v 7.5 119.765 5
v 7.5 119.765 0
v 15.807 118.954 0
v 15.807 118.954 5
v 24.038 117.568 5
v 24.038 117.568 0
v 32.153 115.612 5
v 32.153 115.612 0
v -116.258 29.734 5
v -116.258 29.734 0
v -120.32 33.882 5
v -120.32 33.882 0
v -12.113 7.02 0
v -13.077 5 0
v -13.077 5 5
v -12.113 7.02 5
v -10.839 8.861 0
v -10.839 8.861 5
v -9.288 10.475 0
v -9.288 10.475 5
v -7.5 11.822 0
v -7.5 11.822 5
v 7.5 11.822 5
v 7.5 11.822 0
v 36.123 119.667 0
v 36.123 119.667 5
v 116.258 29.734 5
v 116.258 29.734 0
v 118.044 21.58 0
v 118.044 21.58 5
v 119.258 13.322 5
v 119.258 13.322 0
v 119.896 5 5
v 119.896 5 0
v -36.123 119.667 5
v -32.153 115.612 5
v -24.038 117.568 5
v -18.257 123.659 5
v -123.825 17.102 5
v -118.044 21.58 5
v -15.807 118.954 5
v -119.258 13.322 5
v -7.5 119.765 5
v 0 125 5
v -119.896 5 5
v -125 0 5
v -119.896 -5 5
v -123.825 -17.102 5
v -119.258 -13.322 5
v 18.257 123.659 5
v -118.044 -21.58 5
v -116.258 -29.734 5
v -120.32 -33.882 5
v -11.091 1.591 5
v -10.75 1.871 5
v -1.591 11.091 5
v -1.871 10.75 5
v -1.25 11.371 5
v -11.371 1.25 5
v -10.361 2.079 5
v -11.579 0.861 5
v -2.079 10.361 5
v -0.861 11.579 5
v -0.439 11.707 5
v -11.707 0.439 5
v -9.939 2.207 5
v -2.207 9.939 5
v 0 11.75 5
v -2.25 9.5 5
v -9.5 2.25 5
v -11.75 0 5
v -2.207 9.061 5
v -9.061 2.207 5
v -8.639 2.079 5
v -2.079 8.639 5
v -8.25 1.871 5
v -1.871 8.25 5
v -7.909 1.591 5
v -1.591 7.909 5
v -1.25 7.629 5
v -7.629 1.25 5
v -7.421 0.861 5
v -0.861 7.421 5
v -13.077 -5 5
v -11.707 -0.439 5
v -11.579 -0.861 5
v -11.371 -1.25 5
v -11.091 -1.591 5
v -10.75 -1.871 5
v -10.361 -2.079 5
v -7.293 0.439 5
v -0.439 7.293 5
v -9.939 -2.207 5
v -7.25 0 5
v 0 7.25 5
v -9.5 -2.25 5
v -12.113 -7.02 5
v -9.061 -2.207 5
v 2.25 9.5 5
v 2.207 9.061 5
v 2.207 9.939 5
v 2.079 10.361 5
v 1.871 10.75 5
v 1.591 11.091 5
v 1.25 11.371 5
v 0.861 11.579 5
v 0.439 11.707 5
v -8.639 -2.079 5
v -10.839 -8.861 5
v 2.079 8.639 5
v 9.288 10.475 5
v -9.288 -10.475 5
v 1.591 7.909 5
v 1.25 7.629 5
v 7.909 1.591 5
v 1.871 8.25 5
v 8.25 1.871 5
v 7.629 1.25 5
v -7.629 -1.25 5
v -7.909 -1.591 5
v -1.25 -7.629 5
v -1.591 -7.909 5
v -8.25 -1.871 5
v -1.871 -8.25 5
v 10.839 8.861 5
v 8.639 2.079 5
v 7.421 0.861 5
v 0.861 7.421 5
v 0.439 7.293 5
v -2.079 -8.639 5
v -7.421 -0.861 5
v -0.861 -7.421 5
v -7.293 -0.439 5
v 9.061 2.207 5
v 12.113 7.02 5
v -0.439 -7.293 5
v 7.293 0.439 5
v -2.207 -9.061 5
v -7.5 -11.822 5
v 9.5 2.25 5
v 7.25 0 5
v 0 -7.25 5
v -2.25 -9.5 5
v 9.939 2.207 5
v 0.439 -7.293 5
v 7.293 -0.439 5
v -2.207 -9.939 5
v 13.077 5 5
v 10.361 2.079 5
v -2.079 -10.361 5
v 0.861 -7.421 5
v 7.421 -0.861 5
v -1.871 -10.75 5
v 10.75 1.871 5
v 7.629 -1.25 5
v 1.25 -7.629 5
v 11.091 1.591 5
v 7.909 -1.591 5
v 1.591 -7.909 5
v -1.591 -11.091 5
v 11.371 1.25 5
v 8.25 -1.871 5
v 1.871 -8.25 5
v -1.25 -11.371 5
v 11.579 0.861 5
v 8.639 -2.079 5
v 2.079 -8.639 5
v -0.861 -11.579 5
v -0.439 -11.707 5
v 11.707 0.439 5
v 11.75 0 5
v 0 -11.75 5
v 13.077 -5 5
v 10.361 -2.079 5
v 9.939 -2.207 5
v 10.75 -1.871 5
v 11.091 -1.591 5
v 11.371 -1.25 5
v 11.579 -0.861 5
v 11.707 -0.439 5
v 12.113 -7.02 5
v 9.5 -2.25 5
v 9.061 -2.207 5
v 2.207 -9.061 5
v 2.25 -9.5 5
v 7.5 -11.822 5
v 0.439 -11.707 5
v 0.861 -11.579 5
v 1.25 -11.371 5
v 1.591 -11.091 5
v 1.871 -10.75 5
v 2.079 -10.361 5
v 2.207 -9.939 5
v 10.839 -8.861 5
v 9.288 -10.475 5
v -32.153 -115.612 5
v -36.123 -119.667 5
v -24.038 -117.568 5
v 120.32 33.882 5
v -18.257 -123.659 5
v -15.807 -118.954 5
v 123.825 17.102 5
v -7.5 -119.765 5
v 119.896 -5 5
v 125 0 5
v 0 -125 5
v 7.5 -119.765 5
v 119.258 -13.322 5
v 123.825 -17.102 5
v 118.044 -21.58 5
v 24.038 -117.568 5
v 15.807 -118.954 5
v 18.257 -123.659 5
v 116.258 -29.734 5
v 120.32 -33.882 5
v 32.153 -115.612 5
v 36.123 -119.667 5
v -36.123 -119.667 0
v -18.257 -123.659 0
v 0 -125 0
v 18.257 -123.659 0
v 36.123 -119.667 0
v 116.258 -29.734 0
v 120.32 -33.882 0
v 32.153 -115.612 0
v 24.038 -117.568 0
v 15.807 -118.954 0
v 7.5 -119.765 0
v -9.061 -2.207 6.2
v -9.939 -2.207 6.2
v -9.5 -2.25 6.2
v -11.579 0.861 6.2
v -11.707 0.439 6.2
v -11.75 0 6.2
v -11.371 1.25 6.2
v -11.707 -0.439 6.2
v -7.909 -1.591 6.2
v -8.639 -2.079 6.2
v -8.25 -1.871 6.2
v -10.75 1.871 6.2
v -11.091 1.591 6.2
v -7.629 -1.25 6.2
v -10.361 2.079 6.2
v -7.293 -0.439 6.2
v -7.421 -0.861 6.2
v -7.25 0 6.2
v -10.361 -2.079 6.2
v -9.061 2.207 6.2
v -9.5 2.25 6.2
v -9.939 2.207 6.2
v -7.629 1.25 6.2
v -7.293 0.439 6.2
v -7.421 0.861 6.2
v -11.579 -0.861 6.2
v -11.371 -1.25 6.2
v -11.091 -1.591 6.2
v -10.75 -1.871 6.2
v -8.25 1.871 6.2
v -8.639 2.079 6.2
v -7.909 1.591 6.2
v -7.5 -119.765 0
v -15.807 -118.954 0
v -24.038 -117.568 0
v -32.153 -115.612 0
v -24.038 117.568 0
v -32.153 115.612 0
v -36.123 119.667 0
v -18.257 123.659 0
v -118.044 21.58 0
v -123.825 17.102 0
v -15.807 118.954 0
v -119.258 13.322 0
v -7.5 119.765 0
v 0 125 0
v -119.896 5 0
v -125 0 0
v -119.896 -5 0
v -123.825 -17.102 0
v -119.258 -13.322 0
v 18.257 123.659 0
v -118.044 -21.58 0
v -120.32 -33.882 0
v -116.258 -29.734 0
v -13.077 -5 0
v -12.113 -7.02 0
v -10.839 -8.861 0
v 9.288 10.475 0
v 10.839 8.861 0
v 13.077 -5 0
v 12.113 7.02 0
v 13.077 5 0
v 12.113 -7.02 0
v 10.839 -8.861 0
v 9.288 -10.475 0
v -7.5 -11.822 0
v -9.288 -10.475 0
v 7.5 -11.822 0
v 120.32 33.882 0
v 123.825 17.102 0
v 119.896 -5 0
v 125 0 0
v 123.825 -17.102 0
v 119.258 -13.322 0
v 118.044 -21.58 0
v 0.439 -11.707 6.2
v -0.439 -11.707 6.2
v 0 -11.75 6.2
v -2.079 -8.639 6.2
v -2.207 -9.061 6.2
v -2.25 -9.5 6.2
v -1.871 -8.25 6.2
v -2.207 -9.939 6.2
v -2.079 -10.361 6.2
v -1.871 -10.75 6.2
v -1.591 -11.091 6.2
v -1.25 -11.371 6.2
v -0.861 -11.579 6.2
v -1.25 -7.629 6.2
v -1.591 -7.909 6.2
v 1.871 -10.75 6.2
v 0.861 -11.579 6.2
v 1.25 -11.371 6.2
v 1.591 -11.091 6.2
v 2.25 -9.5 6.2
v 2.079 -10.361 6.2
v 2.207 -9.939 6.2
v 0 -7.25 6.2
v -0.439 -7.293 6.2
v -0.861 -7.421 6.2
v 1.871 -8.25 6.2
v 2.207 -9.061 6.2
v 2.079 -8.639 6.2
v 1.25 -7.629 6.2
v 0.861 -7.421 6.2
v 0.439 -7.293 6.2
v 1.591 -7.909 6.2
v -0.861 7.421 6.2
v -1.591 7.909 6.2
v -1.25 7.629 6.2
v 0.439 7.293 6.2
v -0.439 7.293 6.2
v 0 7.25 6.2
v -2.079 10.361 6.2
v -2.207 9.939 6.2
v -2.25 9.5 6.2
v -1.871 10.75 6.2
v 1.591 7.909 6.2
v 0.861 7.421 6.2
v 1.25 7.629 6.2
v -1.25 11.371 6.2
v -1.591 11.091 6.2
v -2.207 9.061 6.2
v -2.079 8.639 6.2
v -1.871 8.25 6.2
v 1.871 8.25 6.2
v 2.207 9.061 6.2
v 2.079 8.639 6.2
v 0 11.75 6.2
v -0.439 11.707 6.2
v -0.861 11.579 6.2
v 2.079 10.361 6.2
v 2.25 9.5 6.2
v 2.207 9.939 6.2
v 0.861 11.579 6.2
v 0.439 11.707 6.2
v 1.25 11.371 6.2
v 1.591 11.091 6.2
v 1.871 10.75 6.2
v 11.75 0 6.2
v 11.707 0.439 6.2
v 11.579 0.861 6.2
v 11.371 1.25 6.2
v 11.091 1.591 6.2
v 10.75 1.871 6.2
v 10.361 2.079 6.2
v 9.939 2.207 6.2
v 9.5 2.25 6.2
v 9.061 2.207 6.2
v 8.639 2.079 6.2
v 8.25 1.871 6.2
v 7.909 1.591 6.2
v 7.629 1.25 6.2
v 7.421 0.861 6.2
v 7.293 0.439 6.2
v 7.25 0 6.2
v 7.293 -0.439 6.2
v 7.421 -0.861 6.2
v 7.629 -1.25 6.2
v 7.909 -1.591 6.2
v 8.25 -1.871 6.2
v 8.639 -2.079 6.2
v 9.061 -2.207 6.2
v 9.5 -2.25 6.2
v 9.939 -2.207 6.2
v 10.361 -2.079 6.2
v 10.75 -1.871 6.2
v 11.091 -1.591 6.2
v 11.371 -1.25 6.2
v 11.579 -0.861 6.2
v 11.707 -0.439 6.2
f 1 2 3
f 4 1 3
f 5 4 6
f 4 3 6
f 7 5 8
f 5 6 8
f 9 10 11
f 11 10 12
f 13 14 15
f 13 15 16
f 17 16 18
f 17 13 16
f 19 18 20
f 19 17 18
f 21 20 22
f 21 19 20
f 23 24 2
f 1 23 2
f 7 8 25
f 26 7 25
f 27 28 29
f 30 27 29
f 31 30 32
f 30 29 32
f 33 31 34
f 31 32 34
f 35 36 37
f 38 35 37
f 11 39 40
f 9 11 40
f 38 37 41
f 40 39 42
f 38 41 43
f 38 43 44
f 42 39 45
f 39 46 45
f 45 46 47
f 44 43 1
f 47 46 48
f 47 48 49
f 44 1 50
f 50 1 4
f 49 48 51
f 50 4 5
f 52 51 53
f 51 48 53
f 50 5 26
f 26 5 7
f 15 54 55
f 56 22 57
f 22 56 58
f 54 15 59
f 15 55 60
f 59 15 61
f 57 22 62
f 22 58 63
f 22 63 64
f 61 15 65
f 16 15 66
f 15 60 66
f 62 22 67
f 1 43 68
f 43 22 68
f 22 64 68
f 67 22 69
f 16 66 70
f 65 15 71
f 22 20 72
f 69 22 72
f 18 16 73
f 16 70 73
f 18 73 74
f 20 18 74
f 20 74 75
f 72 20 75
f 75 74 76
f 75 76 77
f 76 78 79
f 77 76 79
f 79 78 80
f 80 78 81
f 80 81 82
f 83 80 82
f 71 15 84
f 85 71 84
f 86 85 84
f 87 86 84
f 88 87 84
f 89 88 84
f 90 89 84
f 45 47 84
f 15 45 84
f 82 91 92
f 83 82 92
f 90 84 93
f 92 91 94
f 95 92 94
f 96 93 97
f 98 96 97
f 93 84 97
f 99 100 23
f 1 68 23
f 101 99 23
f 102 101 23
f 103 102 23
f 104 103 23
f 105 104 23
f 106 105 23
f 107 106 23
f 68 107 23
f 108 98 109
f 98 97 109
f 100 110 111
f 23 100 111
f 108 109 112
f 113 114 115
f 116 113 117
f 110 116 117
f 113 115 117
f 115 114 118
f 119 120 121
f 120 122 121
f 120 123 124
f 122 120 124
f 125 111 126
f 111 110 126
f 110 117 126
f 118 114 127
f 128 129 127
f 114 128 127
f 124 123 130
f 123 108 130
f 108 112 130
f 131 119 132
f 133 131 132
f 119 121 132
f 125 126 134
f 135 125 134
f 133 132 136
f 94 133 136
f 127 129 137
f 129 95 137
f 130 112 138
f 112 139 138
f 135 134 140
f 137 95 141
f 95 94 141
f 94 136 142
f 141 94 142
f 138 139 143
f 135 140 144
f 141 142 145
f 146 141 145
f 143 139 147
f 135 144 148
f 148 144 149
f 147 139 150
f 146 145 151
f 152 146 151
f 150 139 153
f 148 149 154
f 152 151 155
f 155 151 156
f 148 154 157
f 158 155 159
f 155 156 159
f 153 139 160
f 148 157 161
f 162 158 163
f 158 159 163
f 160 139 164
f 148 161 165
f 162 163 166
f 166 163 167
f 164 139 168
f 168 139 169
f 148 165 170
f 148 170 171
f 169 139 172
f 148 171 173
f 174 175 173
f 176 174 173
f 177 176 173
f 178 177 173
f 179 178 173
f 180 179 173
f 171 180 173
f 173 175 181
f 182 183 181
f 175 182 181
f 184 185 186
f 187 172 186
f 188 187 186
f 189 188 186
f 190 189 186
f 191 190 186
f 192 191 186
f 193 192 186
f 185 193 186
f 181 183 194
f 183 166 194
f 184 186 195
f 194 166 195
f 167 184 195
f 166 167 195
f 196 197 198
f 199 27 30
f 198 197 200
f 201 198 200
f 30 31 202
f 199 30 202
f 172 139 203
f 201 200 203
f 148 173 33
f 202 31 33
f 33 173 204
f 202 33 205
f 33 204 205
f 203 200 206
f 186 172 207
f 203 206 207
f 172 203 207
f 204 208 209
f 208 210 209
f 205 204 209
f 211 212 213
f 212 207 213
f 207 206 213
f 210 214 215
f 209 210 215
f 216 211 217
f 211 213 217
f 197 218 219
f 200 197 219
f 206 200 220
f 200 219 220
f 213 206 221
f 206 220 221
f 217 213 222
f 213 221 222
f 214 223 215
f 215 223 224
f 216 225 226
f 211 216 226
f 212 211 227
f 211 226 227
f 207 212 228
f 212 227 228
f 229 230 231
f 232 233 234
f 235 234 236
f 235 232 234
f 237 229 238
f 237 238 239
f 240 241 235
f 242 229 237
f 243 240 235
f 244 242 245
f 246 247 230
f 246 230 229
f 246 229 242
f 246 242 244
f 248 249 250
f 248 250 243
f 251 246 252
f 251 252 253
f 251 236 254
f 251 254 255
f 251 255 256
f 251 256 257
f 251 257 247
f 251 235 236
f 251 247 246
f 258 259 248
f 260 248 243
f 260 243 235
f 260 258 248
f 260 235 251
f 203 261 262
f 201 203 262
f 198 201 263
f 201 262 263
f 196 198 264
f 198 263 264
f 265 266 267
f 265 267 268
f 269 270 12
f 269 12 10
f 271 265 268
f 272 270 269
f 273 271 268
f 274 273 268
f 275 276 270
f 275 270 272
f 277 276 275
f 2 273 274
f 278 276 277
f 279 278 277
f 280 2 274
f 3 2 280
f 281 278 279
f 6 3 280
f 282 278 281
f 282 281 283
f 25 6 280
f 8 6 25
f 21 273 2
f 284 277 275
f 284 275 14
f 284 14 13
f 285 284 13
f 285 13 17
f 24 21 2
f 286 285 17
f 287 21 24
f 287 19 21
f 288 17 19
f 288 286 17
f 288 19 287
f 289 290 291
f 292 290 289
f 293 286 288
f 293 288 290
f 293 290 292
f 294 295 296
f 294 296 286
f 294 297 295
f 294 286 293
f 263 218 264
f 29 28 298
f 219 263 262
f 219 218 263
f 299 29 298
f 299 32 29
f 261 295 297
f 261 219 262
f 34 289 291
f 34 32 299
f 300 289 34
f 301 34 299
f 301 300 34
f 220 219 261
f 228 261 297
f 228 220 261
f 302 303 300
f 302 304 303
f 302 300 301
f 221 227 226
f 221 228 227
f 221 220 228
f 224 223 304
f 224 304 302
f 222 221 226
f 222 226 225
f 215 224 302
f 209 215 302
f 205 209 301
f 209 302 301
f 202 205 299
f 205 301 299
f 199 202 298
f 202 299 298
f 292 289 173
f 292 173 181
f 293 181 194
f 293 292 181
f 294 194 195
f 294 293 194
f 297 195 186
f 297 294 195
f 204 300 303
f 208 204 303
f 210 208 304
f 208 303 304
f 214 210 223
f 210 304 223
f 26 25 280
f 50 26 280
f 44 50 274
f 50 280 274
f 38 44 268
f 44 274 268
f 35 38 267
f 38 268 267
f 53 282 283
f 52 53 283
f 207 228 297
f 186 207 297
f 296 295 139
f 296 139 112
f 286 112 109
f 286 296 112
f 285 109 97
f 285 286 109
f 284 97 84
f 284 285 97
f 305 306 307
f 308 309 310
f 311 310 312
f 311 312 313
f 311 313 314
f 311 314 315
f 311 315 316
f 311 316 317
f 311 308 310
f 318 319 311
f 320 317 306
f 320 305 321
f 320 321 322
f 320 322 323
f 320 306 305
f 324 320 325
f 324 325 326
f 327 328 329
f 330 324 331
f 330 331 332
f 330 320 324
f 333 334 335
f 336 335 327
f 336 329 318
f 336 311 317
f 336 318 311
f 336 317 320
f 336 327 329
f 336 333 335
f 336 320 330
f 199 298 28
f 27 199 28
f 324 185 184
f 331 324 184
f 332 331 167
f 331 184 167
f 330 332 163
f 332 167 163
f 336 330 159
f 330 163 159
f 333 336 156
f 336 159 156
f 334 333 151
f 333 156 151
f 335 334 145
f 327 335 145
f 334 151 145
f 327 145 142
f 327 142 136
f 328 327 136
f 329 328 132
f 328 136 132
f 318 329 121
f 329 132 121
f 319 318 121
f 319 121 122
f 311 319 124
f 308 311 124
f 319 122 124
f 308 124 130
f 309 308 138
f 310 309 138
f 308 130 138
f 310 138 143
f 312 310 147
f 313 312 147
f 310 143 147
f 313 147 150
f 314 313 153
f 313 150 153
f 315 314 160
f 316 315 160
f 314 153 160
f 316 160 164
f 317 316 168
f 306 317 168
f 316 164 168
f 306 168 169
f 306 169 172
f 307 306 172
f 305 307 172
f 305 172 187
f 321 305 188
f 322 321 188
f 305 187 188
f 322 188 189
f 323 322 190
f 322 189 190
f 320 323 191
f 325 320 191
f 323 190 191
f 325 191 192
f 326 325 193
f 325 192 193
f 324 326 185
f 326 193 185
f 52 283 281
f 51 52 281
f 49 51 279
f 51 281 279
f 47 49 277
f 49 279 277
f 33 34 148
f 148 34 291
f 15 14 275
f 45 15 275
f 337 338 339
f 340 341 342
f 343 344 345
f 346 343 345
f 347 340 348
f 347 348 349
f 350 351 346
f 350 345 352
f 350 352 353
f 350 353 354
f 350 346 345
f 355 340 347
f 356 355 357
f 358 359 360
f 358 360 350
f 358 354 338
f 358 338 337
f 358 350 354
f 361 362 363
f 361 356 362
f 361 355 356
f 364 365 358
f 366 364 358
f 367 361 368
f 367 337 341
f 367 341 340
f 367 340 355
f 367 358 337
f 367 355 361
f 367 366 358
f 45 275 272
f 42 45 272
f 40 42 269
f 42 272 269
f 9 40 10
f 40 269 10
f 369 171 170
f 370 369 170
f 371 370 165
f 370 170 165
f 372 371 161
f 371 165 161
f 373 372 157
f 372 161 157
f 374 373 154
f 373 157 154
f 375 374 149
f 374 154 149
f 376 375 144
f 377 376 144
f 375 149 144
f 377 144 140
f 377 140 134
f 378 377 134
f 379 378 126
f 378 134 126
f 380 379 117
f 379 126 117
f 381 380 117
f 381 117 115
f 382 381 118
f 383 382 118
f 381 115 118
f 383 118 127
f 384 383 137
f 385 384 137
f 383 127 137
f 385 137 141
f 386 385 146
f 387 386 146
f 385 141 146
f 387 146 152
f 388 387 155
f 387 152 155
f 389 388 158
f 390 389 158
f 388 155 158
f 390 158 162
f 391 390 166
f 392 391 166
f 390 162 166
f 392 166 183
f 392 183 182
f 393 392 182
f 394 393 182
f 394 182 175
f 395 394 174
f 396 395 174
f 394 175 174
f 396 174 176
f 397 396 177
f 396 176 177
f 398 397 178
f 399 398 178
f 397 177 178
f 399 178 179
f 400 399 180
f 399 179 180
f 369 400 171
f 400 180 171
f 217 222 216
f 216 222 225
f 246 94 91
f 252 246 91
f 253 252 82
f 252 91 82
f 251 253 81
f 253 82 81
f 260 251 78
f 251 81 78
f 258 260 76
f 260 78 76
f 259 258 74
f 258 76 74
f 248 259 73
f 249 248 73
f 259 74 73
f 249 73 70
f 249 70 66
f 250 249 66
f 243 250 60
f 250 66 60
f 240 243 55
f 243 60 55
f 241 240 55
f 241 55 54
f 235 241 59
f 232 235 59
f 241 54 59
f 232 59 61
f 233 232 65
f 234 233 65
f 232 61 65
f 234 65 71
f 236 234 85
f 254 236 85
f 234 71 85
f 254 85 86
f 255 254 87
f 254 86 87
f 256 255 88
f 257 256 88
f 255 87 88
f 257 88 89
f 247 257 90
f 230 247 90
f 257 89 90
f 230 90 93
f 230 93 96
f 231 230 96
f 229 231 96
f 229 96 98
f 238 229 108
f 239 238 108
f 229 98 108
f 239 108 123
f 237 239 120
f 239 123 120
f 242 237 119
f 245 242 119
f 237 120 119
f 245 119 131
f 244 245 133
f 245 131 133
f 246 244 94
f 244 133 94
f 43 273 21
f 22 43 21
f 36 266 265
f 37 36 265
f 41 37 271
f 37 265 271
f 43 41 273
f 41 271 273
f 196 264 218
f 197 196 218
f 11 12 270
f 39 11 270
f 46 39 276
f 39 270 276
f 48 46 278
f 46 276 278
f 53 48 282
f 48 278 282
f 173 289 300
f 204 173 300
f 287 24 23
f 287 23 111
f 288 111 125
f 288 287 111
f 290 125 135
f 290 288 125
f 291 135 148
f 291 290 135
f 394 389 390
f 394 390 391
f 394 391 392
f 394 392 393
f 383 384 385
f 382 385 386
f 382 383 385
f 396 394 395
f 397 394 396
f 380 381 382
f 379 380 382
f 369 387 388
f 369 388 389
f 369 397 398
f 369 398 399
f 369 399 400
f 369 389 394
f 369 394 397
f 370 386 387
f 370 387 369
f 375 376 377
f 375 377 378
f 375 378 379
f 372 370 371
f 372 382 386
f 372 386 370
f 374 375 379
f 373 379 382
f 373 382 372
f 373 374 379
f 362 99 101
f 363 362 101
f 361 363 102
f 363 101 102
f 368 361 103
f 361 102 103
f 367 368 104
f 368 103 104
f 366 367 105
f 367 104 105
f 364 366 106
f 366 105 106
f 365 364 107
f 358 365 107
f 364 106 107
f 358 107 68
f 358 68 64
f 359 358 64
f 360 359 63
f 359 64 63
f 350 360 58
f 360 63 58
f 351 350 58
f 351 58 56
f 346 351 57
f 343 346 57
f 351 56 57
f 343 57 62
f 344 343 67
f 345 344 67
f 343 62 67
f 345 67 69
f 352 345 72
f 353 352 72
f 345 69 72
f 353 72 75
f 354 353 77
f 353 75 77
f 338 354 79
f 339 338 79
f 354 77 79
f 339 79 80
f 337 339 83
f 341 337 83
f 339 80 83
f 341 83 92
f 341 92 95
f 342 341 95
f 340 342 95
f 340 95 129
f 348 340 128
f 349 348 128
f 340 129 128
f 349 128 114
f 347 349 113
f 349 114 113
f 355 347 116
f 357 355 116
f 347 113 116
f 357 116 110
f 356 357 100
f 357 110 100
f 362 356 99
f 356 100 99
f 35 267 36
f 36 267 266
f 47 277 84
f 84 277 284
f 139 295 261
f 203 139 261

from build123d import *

# Parameters (mm, degrees)
F1_DEPTH = 5
F3_DEPTH = 5
F4_R     = 2.25
F5_DEPTH = 1.2


with BuildPart() as f1:
    # F0 (on Top) → F1 (new body)
    with BuildSketch(Plane.XY):
        with BuildLine():
            ThreePointArc((-116.2578831103, -29.7338967292), (-118.7227043002, -17.4619438679), (-119.8957880828, -5))
            Line((-119.8957880828, -5), (-7.5, -5))
            Line((-7.5, -5), (-7.5, -119.76539567))
            ThreePointArc((-7.5, -119.76539567), (-19.9347609629, -118.3326045744), (-32.152625953, -115.6123204694))
            Line((-32.152625953, -115.6123204694), (-36.1232570919, -119.6666632654))
            ThreePointArc((-36.1232570919, -119.6666632654), (0, -125), (36.1232570919, -119.6666632654))
            Line((36.1232570919, -119.6666632654), (32.152625953, -115.6123204694))
            ThreePointArc((32.152625953, -115.6123204694), (19.9347609629, -118.3326045744), (7.5, -119.76539567))
            Line((7.5, -119.76539567), (7.5, -5))
            Line((7.5, -5), (119.8957880828, -5))
            ThreePointArc((119.8957880828, -5), (118.7227043002, -17.4619438679), (116.2578831103, -29.7338967292))
            Line((116.2578831103, -29.7338967292), (120.3204231937, -33.8820861591))
            ThreePointArc((120.3204231937, -33.8820861591), (125, 0), (120.3204231937, 33.8820861591))
            Line((120.3204231937, 33.8820861591), (116.2578831103, 29.7338967292))
            ThreePointArc((116.2578831103, 29.7338967292), (118.7227043002, 17.4619438679), (119.8957880828, 5))
            Line((119.8957880828, 5), (7.5, 5))
            Line((7.5, 5), (7.5, 119.76539567))
            ThreePointArc((7.5, 119.76539567), (19.9347609629, 118.3326045744), (32.152625953, 115.6123204694))
            Line((32.152625953, 115.6123204694), (36.1232570919, 119.6666632654))
            ThreePointArc((36.1232570919, 119.6666632654), (0, 125), (-36.1232570919, 119.6666632654))
            Line((-36.1232570919, 119.6666632654), (-32.152625953, 115.6123204694))
            ThreePointArc((-32.152625953, 115.6123204694), (-19.9347609629, 118.3326045744), (-7.5, 119.76539567))
            Line((-7.5, 119.76539567), (-7.5, 5))
            Line((-7.5, 5), (-119.8957880828, 5))
            ThreePointArc((-119.8957880828, 5), (-118.7227043002, 17.4619438679), (-116.2578831103, 29.7338967292))
            Line((-116.2578831103, 29.7338967292), (-120.3204231937, 33.8820861591))
            ThreePointArc((-120.3204231937, 33.8820861591), (-125, 0), (-120.3204231937, -33.8820861591))
            Line((-120.3204231937, -33.8820861591), (-116.2578831103, -29.7338967292))
        make_face()
    extrude(amount=F1_DEPTH)

    # F2 (on face) → F3 (join)
    with BuildSketch(Plane(origin=(0, 0, 0), x_dir=(1, 0, 0), z_dir=(0, 0, -1))):
        with BuildLine():
            Line((7.5, 5), (13.0766968306, 5))
            ThreePointArc((13.0766968306, 5), (10.8389869024, 8.8609459387), (7.5, 11.8215904175))
            Line((7.5, 11.8215904175), (7.5, 5))
        make_face()
        with BuildLine():
            ThreePointArc((7.5, -11.8215904175), (10.8389869024, -8.8609459387), (13.0766968306, -5))
            Line((13.0766968306, -5), (7.5, -5))
            Line((7.5, -5), (7.5, -11.8215904175))
        make_face()
        with BuildLine():
            ThreePointArc((-13.0766968306, -5), (-10.8389869024, -8.8609459387), (-7.5, -11.8215904175))
            Line((-7.5, -11.8215904175), (-7.5, -5))
            Line((-7.5, -5), (-13.0766968306, -5))
        make_face()
        with BuildLine():
            Line((-7.5, 5), (-7.5, 11.8215904175))
            ThreePointArc((-7.5, 11.8215904175), (-10.8389869024, 8.8609459387), (-13.0766968306, 5))
            Line((-13.0766968306, 5), (-7.5, 5))
        make_face()
    extrude(amount=-F3_DEPTH)

    # F4 (on face) → F5 (join)
    with BuildSketch(Plane.XY.offset(5)):
        with Locations((0, 9.5)):
            Circle(F4_R)
        with Locations((-9.5, 0)):
            Circle(F4_R)
        with Locations((0, -9.5)):
            Circle(F4_R)
        with Locations((9.5, 0)):
            Circle(F4_R)
    extrude(amount=F5_DEPTH)


solid = f1.part
